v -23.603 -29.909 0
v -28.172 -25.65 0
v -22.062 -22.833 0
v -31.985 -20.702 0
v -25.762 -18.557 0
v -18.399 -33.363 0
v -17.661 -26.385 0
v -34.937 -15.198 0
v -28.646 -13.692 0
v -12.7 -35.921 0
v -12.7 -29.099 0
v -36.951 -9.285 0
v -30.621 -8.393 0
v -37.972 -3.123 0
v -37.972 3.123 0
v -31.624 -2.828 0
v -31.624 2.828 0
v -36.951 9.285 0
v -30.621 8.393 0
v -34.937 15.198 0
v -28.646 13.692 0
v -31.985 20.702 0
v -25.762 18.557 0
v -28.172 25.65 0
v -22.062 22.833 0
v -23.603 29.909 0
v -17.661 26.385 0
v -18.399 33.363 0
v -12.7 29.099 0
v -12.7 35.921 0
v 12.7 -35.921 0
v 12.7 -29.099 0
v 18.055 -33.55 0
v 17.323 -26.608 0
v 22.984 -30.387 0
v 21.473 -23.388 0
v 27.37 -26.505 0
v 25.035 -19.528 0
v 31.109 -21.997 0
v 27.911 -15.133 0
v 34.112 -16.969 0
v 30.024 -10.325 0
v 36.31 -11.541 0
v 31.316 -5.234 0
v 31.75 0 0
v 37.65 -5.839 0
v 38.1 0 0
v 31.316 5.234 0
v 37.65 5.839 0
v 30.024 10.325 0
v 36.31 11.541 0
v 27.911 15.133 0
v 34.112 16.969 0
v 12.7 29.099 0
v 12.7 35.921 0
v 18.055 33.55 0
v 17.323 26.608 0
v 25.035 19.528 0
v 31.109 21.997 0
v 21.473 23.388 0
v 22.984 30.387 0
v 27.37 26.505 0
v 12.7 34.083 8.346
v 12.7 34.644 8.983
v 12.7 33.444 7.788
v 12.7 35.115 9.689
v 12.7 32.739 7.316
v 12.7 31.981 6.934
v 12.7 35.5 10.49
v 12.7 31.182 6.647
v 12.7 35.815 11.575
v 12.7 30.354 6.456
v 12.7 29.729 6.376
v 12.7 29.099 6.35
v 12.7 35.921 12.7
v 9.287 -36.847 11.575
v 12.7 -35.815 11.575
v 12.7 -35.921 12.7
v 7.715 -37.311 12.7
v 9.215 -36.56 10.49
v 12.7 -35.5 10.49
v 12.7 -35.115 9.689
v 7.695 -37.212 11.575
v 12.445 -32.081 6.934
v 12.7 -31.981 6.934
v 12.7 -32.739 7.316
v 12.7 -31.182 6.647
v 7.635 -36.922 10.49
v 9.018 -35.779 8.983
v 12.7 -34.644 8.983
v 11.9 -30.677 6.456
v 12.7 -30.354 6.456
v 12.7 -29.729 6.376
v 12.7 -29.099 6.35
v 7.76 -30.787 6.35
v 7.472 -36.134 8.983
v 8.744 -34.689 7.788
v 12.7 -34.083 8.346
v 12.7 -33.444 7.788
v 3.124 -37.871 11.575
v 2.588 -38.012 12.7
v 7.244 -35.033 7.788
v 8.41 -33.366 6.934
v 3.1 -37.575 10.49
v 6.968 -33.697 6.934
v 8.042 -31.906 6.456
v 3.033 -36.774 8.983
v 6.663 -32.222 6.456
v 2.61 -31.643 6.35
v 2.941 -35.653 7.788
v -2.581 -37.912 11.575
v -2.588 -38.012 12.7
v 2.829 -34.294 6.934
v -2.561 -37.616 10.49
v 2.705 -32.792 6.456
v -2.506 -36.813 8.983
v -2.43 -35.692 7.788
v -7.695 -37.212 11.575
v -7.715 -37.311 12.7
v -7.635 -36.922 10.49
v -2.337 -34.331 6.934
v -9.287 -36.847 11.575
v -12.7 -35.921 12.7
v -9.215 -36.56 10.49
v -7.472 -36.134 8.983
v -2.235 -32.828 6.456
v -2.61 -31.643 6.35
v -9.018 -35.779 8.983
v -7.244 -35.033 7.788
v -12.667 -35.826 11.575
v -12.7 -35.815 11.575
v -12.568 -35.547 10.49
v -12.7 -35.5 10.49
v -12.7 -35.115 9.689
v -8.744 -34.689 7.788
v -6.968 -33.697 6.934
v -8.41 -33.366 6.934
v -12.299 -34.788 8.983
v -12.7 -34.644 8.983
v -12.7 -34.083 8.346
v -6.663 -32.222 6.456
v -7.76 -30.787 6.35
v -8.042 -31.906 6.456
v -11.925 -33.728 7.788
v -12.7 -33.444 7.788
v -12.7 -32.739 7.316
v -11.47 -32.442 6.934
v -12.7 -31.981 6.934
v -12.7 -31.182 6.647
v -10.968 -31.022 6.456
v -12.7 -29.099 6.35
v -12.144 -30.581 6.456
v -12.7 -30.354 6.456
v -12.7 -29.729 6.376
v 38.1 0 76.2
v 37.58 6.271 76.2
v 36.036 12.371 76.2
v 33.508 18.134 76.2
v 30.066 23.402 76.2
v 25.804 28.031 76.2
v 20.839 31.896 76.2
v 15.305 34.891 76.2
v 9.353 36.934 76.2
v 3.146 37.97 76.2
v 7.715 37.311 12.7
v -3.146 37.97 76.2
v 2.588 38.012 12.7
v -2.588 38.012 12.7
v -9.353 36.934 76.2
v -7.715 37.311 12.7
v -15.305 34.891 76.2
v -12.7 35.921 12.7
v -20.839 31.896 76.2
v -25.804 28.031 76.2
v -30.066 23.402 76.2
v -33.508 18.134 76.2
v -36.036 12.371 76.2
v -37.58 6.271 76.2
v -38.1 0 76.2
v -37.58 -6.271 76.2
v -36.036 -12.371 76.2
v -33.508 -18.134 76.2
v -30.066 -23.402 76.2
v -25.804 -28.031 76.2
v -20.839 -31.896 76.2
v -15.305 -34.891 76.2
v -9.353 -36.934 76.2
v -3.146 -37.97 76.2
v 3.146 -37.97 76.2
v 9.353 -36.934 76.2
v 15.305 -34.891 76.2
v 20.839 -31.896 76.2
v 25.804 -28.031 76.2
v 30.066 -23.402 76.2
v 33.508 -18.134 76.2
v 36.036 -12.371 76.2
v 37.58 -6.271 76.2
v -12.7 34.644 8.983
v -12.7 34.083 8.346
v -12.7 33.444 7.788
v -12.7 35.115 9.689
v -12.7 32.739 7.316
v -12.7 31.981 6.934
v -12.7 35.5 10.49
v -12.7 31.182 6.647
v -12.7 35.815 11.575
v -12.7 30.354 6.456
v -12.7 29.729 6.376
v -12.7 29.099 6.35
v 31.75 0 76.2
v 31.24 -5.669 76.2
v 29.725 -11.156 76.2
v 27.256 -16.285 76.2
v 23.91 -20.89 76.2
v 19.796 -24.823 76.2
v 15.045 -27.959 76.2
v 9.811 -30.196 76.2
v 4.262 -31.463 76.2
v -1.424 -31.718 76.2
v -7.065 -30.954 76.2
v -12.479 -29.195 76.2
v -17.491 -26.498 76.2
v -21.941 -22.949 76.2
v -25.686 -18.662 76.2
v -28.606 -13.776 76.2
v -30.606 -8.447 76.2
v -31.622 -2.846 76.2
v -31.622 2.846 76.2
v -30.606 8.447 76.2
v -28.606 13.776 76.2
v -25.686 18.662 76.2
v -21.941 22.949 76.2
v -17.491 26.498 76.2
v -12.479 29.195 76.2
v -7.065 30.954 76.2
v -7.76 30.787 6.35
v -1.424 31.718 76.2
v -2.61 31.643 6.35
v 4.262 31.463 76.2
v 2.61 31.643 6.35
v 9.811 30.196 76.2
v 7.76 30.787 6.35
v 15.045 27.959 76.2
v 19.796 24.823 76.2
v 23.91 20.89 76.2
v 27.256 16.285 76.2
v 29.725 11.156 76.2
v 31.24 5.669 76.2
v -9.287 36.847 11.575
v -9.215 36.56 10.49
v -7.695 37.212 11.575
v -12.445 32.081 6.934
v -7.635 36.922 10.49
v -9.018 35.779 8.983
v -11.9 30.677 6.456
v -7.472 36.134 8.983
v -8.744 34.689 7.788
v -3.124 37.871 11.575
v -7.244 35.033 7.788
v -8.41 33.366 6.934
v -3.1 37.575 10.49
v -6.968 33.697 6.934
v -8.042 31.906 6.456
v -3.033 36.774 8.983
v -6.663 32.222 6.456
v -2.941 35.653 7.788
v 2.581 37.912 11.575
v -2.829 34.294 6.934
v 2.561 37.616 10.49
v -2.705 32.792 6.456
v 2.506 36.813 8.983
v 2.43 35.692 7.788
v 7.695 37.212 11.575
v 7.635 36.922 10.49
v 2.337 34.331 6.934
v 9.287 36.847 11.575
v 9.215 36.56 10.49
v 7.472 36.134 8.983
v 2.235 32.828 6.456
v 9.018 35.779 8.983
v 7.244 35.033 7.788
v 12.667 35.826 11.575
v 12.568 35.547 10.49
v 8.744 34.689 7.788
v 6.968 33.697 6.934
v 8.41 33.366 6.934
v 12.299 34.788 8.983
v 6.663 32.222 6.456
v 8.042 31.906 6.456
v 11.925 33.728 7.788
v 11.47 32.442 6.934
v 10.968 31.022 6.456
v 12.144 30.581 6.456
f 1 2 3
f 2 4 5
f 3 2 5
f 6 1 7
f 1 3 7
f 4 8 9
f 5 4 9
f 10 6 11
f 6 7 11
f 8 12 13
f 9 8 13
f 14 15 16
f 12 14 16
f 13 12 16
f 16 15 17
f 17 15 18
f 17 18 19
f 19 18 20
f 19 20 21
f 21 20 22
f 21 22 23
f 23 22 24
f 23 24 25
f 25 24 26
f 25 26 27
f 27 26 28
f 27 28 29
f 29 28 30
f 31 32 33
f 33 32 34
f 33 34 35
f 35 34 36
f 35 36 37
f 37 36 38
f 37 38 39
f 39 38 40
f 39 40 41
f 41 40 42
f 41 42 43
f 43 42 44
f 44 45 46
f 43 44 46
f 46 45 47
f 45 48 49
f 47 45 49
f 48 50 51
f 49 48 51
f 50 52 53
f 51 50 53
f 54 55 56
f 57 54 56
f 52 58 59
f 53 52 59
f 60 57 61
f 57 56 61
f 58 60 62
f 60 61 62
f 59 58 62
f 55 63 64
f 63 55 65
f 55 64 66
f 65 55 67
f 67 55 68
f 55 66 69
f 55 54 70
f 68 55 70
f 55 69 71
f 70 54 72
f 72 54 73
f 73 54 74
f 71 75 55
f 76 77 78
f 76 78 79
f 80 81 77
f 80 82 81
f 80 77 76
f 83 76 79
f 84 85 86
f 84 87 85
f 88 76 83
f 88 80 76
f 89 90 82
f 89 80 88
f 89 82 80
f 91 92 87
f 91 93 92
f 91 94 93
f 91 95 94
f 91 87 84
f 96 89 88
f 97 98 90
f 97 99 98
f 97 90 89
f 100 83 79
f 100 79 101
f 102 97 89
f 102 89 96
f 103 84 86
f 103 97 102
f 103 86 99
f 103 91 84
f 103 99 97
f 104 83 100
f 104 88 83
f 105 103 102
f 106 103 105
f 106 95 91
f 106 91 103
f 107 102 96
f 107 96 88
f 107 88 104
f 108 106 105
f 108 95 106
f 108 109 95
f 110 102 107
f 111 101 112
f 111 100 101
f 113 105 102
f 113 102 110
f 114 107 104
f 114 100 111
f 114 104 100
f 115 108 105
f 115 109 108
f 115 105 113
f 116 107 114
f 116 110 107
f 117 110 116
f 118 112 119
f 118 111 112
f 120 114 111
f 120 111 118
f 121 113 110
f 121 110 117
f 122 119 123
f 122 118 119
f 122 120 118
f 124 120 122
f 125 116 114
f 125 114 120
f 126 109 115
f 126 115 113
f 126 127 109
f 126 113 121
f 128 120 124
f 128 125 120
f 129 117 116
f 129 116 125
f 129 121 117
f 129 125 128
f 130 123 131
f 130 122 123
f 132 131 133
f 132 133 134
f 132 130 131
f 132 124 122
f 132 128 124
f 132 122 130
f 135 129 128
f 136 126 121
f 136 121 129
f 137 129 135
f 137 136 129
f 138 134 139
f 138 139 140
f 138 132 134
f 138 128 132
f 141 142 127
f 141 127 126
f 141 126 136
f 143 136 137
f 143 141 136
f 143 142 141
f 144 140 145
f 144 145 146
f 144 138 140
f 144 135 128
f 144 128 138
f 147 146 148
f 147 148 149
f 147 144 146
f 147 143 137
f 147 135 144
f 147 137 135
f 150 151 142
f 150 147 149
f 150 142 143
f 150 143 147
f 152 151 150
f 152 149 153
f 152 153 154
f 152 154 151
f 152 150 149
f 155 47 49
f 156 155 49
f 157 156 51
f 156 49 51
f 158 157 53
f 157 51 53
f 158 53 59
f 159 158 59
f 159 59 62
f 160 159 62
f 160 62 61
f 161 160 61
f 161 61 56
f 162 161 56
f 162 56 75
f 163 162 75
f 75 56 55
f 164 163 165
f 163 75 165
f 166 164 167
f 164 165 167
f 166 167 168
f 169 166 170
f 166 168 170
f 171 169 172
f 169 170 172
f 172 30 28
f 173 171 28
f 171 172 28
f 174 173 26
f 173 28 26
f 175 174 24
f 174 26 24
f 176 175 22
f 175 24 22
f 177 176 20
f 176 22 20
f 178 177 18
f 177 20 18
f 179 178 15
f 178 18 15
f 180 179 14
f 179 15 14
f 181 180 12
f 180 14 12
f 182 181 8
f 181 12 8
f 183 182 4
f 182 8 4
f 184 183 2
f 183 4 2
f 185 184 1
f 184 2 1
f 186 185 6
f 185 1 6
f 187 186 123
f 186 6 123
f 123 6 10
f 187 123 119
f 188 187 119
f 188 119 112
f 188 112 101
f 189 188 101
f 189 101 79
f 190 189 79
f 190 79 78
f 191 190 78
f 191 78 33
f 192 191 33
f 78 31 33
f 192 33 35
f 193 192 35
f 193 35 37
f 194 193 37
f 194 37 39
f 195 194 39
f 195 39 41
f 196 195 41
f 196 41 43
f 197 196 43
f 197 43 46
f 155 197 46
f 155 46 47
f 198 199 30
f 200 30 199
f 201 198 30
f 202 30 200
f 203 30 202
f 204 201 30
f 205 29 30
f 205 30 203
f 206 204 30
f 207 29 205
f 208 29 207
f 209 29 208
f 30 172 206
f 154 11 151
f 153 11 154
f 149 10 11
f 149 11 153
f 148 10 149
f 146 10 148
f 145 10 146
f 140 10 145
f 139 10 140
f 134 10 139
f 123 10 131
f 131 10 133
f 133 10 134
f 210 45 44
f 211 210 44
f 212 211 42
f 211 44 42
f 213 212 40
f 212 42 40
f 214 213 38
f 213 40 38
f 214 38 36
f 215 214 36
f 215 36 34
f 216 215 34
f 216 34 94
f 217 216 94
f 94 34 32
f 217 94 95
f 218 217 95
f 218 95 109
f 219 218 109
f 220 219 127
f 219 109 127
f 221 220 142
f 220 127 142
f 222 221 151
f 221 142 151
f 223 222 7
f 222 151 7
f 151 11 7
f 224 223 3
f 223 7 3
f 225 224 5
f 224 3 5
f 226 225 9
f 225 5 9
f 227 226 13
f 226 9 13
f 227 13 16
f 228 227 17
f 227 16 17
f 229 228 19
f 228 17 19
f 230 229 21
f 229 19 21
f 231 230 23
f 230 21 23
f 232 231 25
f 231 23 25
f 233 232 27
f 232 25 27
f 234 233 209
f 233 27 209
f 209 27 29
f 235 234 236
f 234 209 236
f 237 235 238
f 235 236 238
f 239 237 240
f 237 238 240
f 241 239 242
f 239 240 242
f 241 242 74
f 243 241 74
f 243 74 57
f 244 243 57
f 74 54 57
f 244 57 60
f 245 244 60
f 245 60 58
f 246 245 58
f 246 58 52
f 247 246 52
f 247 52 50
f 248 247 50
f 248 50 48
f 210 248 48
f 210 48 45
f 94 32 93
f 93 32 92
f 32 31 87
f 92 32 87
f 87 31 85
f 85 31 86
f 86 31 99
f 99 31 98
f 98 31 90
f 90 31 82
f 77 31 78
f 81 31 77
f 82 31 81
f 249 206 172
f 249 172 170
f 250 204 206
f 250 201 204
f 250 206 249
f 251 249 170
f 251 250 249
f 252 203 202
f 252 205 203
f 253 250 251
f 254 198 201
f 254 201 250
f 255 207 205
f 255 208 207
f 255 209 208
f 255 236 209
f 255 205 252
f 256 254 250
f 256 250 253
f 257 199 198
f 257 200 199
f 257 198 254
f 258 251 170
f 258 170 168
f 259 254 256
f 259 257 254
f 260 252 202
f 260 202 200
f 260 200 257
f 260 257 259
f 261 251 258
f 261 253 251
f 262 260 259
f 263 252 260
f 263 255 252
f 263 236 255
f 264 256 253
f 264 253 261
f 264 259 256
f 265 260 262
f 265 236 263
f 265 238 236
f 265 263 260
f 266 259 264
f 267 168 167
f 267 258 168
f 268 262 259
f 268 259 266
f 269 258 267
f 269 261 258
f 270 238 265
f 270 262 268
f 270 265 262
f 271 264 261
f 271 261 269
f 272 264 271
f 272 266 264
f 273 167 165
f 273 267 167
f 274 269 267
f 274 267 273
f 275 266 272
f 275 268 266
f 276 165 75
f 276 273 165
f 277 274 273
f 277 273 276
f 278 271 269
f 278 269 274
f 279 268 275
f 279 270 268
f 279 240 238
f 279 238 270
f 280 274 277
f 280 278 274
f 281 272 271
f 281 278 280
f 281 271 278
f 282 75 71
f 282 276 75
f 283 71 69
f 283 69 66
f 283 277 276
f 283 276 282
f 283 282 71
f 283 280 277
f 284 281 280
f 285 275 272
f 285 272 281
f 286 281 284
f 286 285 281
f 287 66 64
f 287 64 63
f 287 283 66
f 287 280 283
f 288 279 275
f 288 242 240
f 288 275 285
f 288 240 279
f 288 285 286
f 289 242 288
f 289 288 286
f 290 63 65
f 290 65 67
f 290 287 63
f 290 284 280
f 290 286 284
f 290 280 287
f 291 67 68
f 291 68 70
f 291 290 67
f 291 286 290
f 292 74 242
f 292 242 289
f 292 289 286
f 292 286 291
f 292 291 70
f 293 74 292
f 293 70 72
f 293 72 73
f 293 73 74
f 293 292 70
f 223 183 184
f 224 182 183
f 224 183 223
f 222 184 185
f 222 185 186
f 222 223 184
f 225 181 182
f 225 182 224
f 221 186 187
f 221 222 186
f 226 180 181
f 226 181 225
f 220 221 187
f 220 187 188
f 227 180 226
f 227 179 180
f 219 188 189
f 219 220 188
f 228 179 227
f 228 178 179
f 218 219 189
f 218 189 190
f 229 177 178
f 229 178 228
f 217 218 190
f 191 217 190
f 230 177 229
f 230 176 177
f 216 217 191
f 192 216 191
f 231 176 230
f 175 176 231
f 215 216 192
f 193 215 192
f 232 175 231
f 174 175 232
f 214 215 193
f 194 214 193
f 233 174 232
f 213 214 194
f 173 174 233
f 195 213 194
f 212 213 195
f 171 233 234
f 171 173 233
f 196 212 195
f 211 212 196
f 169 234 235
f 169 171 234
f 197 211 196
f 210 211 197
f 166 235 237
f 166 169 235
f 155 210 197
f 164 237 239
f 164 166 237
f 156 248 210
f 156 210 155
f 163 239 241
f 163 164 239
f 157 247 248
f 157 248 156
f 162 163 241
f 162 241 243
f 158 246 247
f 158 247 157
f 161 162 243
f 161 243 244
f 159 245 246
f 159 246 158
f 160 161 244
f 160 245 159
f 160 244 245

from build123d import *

# Parameters (mm, degrees)
F0_R     = 38.1
F1_DEPTH = 76.2
F2_W     = 25.4
F2_H     = 12.7
F3_DEPTH = 63.5
F4_R     = 6.35
F5_R     = 31.75
F6_DEPTH = 76.201


with BuildPart() as f1:
    # F0 (on Top) → F1 (new body)
    with BuildSketch(Plane.XY):
        Circle(F0_R)
    extrude(amount=F1_DEPTH)

    # F2 (on Front) → F3 (cut, symmetric)
    with BuildSketch(Plane.XZ):
        Rectangle(F2_W, F2_H)
    extrude(amount=F3_DEPTH, both=True, mode=Mode.SUBTRACT)

    # F4
    f4_edges = [f1.edges().sort_by_distance(p)[0] for p in [
        (0, 38.1, 6.35),
        (0, -38.1, 6.35),
    ]]
    fillet(f4_edges, radius=F4_R)

    # F5 (on face) → F6 (cut, through all)
    with BuildSketch(Plane(origin=(0, 0, 0), x_dir=(1, 0, 0), z_dir=(0, 0, -1))):
        Circle(F5_R)
    extrude(amount=-F6_DEPTH, mode=Mode.SUBTRACT)


solid = f1.part
